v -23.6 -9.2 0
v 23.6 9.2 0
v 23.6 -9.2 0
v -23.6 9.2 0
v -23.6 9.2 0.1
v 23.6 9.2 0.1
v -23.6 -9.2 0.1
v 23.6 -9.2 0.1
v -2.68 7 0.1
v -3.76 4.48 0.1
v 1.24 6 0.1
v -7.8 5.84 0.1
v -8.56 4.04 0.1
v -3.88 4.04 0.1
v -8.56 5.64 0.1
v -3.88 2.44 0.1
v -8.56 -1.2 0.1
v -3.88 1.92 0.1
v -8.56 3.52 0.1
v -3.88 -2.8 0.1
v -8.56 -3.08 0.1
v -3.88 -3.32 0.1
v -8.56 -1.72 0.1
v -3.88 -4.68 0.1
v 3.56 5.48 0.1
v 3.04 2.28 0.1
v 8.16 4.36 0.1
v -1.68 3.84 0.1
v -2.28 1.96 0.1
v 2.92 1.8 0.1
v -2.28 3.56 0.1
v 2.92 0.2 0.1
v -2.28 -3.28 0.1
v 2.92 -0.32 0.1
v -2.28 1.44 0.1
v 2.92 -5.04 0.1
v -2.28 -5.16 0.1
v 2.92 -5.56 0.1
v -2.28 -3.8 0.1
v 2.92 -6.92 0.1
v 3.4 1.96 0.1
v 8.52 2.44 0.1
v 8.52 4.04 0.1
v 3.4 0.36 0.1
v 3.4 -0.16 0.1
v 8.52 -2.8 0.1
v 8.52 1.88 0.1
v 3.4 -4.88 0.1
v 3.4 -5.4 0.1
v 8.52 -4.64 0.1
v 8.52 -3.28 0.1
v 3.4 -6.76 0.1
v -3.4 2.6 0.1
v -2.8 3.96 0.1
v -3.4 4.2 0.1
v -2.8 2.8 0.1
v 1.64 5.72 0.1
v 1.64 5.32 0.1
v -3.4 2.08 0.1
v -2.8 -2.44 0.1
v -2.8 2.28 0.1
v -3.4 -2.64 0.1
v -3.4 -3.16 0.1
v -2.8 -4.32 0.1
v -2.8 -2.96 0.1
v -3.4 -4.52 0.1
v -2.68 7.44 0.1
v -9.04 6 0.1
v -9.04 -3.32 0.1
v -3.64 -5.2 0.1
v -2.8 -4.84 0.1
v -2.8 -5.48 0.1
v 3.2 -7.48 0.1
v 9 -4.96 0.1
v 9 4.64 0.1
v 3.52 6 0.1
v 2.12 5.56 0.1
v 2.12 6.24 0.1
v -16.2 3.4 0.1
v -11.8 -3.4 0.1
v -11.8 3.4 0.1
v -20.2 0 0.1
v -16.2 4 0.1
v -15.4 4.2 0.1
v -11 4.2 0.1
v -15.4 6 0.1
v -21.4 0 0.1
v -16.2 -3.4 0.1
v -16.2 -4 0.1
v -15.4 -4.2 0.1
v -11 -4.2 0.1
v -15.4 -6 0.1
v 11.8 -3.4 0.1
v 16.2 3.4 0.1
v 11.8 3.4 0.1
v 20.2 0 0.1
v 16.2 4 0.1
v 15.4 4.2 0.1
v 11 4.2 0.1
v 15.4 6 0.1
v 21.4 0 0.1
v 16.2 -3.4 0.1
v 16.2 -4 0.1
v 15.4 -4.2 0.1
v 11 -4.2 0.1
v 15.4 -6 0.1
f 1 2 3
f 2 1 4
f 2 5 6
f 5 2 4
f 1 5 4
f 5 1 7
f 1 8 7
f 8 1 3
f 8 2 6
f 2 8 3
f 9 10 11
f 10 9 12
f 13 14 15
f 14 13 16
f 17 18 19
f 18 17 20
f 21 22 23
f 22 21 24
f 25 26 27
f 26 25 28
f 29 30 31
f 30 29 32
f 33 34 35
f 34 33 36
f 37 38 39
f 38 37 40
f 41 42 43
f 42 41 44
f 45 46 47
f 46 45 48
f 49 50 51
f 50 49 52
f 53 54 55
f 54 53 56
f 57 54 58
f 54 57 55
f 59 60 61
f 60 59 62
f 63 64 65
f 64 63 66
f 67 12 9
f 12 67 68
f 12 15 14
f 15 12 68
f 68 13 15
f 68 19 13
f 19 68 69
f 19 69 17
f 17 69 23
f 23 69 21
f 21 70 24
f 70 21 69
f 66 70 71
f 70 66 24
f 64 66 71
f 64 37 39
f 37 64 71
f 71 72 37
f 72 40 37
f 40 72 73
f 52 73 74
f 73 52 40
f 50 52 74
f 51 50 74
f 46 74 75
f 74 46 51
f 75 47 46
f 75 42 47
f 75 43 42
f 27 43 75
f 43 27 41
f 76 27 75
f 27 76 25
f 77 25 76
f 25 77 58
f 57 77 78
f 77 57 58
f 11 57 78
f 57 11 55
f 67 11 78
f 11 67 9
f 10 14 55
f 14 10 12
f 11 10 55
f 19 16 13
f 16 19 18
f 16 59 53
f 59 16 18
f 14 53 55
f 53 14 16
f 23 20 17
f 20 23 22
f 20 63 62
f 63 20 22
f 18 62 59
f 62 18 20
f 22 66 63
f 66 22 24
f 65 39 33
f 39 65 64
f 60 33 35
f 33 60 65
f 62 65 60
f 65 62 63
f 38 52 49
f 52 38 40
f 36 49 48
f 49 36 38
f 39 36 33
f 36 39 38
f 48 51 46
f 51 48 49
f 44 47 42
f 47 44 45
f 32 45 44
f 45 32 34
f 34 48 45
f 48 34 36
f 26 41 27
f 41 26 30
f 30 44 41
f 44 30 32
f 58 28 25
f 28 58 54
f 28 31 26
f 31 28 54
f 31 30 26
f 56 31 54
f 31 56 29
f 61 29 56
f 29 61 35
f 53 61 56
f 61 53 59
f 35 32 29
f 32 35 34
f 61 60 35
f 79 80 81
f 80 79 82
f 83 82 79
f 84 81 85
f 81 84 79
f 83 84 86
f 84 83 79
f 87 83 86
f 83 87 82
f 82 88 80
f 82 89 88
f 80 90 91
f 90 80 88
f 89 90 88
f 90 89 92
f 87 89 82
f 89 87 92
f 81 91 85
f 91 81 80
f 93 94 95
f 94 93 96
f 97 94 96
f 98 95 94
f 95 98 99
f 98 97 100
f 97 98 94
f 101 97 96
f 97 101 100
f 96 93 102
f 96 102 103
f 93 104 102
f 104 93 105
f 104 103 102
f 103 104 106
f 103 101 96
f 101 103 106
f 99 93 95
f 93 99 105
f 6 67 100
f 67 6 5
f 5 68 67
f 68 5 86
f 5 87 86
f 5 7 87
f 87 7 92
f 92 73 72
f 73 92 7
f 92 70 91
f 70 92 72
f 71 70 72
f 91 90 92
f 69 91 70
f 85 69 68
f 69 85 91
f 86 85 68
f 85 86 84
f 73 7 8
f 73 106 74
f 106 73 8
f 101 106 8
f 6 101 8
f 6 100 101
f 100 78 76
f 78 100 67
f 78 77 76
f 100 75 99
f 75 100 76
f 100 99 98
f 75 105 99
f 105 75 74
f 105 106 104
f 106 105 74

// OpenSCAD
// file: ../p/box5-12.scad
use <../lib.scad>
function ldraw_lib__box5_12() = [
// 0 Box with 5 Faces without Any Edges
// 0 Name: box5-12.dat
// 0 Author: Chris Dee [cwdee]
// 0 !LDRAW_ORG Primitive UPDATE 2009-02
// 0 !LICENSE Licensed under CC BY 4.0 : see CAreadme.txt
// 
// 0 BFC CERTIFY CCW
  [0,"BFC","CERTIFY"],
  [0,"BFC","CCW"],
// 
// 0 !HISTORY 2009-09-03 [PTadmin] Official Update 2009-02
// 
// 
// 4 16 1 1 1 1 1 -1 -1 1 -1 -1 1 1
  [4,16,1,1,1,1,1,-1,-1,1,-1,-1,1,1],
// 4 16 -1 0 1 1 0 1 1 1 1 -1 1 1
  [4,16,-1,0,1,1,0,1,1,1,1,-1,1,1],
// 4 16 -1 0 -1 -1 0 1 -1 1 1 -1 1 -1
  [4,16,-1,0,-1,-1,0,1,-1,1,1,-1,1,-1],
// 4 16 1 0 -1 -1 0 -1 -1 1 -1 1 1 -1
  [4,16,1,0,-1,-1,0,-1,-1,1,-1,1,1,-1],
// 4 16 1 0 1 1 0 -1 1 1 -1 1 1 1
  [4,16,1,0,1,1,0,-1,1,1,-1,1,1,1],
// 0
];
module ldraw_lib__box5_12(step=0, col=false, unit=2/5, alt=false, line=0.2, solid=!$preview)
    makepoly(ldraw_lib__box5_12(), step=step, col=col, unit=unit, alt=alt, line=line, solid=solid);
ldraw_lib__box5_12(line=0.2);
// main file
use <../lib.scad>
use <../p/box5-12.scad>
function ldraw_lib__195645a() = [
// 0 Sticker  2.3 x  5.9 with Boxes and Arrows
// 0 Name: 195645a.dat
// 0 Author: Takeshi Takahashi [RainbowDolphin]
// 0 !LDRAW_ORG Part UPDATE 2025-03
// 0 !LICENSE Licensed under CC BY 4.0 : see CAreadme.txt
// 
// 0 BFC CERTIFY CCW
  [0,"BFC","CERTIFY"],
  [0,"BFC","CCW"],
// 
// 0 !KEYWORDS Bricklink 6391stk01, Brickowl 195645, Cargo, Parcel
// 0 !KEYWORDS Rebrickable 195645, Set 6391, Signboard
// 
// 0 !HISTORY 2025-03-30 [OrionP] Official Update 2025-03
// 
// 1 16 0 -0.25 0 59 0 0 0 0.25 0 0 0 23 box5-12.dat
  [1,16,0,-0.25,0,59,0,0,0,0.25,0,0,0,23, ldraw_lib__box5_12()],
// 4 14 -6.7 -0.25 17.5 -19.5 -0.25 14.6 -9.4 -0.25 11.2 3.1 -0.25 15
  [4,14,-6.7,-0.25,17.5,-19.5,-0.25,14.6,-9.4,-0.25,11.2,3.1,-0.25,15],
// 4 14 -9.7 -0.25 6.1 -9.7 -0.25 10.1 -21.4 -0.25 14.1 -21.4 -0.25 10.1
  [4,14,-9.7,-0.25,6.1,-9.7,-0.25,10.1,-21.4,-0.25,14.1,-21.4,-0.25,10.1],
// 4 14 -9.7 -0.25 4.8 -21.4 -0.25 8.8 -21.4 -0.25 -3 -9.7 -0.25 -7
  [4,14,-9.7,-0.25,4.8,-21.4,-0.25,8.8,-21.4,-0.25,-3,-9.7,-0.25,-7],
// 4 14 -9.7 -0.25 -8.3 -21.4 -0.25 -4.3 -21.4 -0.25 -7.7 -9.7 -0.25 -11.7
  [4,14,-9.7,-0.25,-8.3,-21.4,-0.25,-4.3,-21.4,-0.25,-7.7,-9.7,-0.25,-11.7],
// 4 14 8.9 -0.25 13.7 -4.2 -0.25 9.6 7.6 -0.25 5.7 20.4 -0.25 10.9
  [4,14,8.9,-0.25,13.7,-4.2,-0.25,9.6,7.6,-0.25,5.7,20.4,-0.25,10.9],
// 4 14 7.3 -0.25 0.5 7.3 -0.25 4.5 -5.7 -0.25 8.9 -5.7 -0.25 4.9
  [4,14,7.3,-0.25,0.5,7.3,-0.25,4.5,-5.7,-0.25,8.9,-5.7,-0.25,4.9],
// 4 14 7.3 -0.25 -0.8 -5.7 -0.25 3.6 -5.7 -0.25 -8.2 7.3 -0.25 -12.6
  [4,14,7.3,-0.25,-0.8,-5.7,-0.25,3.6,-5.7,-0.25,-8.2,7.3,-0.25,-12.6],
// 4 14 7.3 -0.25 -13.9 -5.7 -0.25 -9.5 -5.7 -0.25 -12.9 7.3 -0.25 -17.3
  [4,14,7.3,-0.25,-13.9,-5.7,-0.25,-9.5,-5.7,-0.25,-12.9,7.3,-0.25,-17.3],
// 4 14 21.3 -0.25 10.1 8.5 -0.25 4.9 8.5 -0.25 0.9 21.3 -0.25 6.1
  [4,14,21.3,-0.25,10.1,8.5,-0.25,4.9,8.5,-0.25,0.9,21.3,-0.25,6.1],
// 4 14 21.3 -0.25 -7 21.3 -0.25 4.7 8.5 -0.25 -0.4 8.5 -0.25 -12.2
  [4,14,21.3,-0.25,-7,21.3,-0.25,4.7,8.5,-0.25,-0.4,8.5,-0.25,-12.2],
// 4 14 21.3 -0.25 -8.2 8.5 -0.25 -13.5 8.5 -0.25 -16.9 21.3 -0.25 -11.6
  [4,14,21.3,-0.25,-8.2,8.5,-0.25,-13.5,8.5,-0.25,-16.9,21.3,-0.25,-11.6],
// 4 14 -8.5 -0.25 10.5 -8.5 -0.25 6.5 -7 -0.25 7 -7 -0.25 9.9
  [4,14,-8.5,-0.25,10.5,-8.5,-0.25,6.5,-7,-0.25,7,-7,-0.25,9.9],
// 4 14 4.1 -0.25 14.3 -8.5 -0.25 10.5 -7 -0.25 9.9 4.1 -0.25 13.3
  [4,14,4.1,-0.25,14.3,-8.5,-0.25,10.5,-7,-0.25,9.9,4.1,-0.25,13.3],
// 4 14 -7 -0.25 5.7 -8.5 -0.25 5.2 -8.5 -0.25 -6.6 -7 -0.25 -6.1
  [4,14,-7,-0.25,5.7,-8.5,-0.25,5.2,-8.5,-0.25,-6.6,-7,-0.25,-6.1],
// 4 14 -7 -0.25 -7.4 -8.5 -0.25 -7.9 -8.5 -0.25 -11.3 -7 -0.25 -10.8
  [4,14,-7,-0.25,-7.4,-8.5,-0.25,-7.9,-8.5,-0.25,-11.3,-7,-0.25,-10.8],
// 4 0 -6.7 -0.25 17.5 -6.7 -0.25 18.6 -22.6 -0.25 15 -19.5 -0.25 14.6
  [4,0,-6.7,-0.25,17.5,-6.7,-0.25,18.6,-22.6,-0.25,15,-19.5,-0.25,14.6],
// 4 0 -19.5 -0.25 14.6 -22.6 -0.25 15 -21.4 -0.25 14.1 -9.7 -0.25 10.1
  [4,0,-19.5,-0.25,14.6,-22.6,-0.25,15,-21.4,-0.25,14.1,-9.7,-0.25,10.1],
// 3 0 -22.6 -0.25 15 -21.4 -0.25 10.1 -21.4 -0.25 14.1
  [3,0,-22.6,-0.25,15,-21.4,-0.25,10.1,-21.4,-0.25,14.1],
// 4 0 -21.4 -0.25 8.8 -21.4 -0.25 10.1 -22.6 -0.25 15 -22.6 -0.25 -8.3
  [4,0,-21.4,-0.25,8.8,-21.4,-0.25,10.1,-22.6,-0.25,15,-22.6,-0.25,-8.3],
// 3 0 -21.4 -0.25 8.8 -22.6 -0.25 -8.3 -21.4 -0.25 -3
  [3,0,-21.4,-0.25,8.8,-22.6,-0.25,-8.3,-21.4,-0.25,-3],
// 3 0 -21.4 -0.25 -3 -22.6 -0.25 -8.3 -21.4 -0.25 -4.3
  [3,0,-21.4,-0.25,-3,-22.6,-0.25,-8.3,-21.4,-0.25,-4.3],
// 3 0 -21.4 -0.25 -4.3 -22.6 -0.25 -8.3 -21.4 -0.25 -7.7
  [3,0,-21.4,-0.25,-4.3,-22.6,-0.25,-8.3,-21.4,-0.25,-7.7],
// 4 0 -21.4 -0.25 -7.7 -22.6 -0.25 -8.3 -9.1 -0.25 -13 -9.7 -0.25 -11.7
  [4,0,-21.4,-0.25,-7.7,-22.6,-0.25,-8.3,-9.1,-0.25,-13,-9.7,-0.25,-11.7],
// 4 0 -8.5 -0.25 -11.3 -9.7 -0.25 -11.7 -9.1 -0.25 -13 -7 -0.25 -12.1
  [4,0,-8.5,-0.25,-11.3,-9.7,-0.25,-11.7,-9.1,-0.25,-13,-7,-0.25,-12.1],
// 3 0 -7 -0.25 -10.8 -8.5 -0.25 -11.3 -7 -0.25 -12.1
  [3,0,-7,-0.25,-10.8,-8.5,-0.25,-11.3,-7,-0.25,-12.1],
// 4 0 -5.7 -0.25 -9.5 -7 -0.25 -10.8 -7 -0.25 -12.1 -5.7 -0.25 -12.9
  [4,0,-5.7,-0.25,-9.5,-7,-0.25,-10.8,-7,-0.25,-12.1,-5.7,-0.25,-12.9],
// 3 0 -7 -0.25 -12.1 -7 -0.25 -13.7 -5.7 -0.25 -12.9
  [3,0,-7,-0.25,-12.1,-7,-0.25,-13.7,-5.7,-0.25,-12.9],
// 4 0 7.3 -0.25 -17.3 -5.7 -0.25 -12.9 -7 -0.25 -13.7 8 -0.25 -18.7
  [4,0,7.3,-0.25,-17.3,-5.7,-0.25,-12.9,-7,-0.25,-13.7,8,-0.25,-18.7],
// 4 0 8.5 -0.25 -16.9 7.3 -0.25 -17.3 8 -0.25 -18.7 22.5 -0.25 -12.4
  [4,0,8.5,-0.25,-16.9,7.3,-0.25,-17.3,8,-0.25,-18.7,22.5,-0.25,-12.4],
// 3 0 21.3 -0.25 -11.6 8.5 -0.25 -16.9 22.5 -0.25 -12.4
  [3,0,21.3,-0.25,-11.6,8.5,-0.25,-16.9,22.5,-0.25,-12.4],
// 3 0 21.3 -0.25 -8.2 21.3 -0.25 -11.6 22.5 -0.25 -12.4
  [3,0,21.3,-0.25,-8.2,21.3,-0.25,-11.6,22.5,-0.25,-12.4],
// 4 0 21.3 -0.25 -7 21.3 -0.25 -8.2 22.5 -0.25 -12.4 22.5 -0.25 11.6
  [4,0,21.3,-0.25,-7,21.3,-0.25,-8.2,22.5,-0.25,-12.4,22.5,-0.25,11.6],
// 3 0 22.5 -0.25 11.6 21.3 -0.25 4.7 21.3 -0.25 -7
  [3,0,22.5,-0.25,11.6,21.3,-0.25,4.7,21.3,-0.25,-7],
// 3 0 22.5 -0.25 11.6 21.3 -0.25 6.1 21.3 -0.25 4.7
  [3,0,22.5,-0.25,11.6,21.3,-0.25,6.1,21.3,-0.25,4.7],
// 3 0 22.5 -0.25 11.6 21.3 -0.25 10.1 21.3 -0.25 6.1
  [3,0,22.5,-0.25,11.6,21.3,-0.25,10.1,21.3,-0.25,6.1],
// 4 0 21.3 -0.25 10.1 22.5 -0.25 11.6 20.4 -0.25 10.9 8.5 -0.25 4.9
  [4,0,21.3,-0.25,10.1,22.5,-0.25,11.6,20.4,-0.25,10.9,8.5,-0.25,4.9],
// 4 0 20.4 -0.25 10.9 22.5 -0.25 11.6 8.8 -0.25 15 8.9 -0.25 13.7
  [4,0,20.4,-0.25,10.9,22.5,-0.25,11.6,8.8,-0.25,15,8.9,-0.25,13.7],
// 4 0 8.9 -0.25 13.7 8.8 -0.25 15 5.3 -0.25 13.9 4.1 -0.25 13.3
  [4,0,8.9,-0.25,13.7,8.8,-0.25,15,5.3,-0.25,13.9,4.1,-0.25,13.3],
// 4 0 4.1 -0.25 14.3 4.1 -0.25 13.3 5.3 -0.25 13.9 5.3 -0.25 15.6
  [4,0,4.1,-0.25,14.3,4.1,-0.25,13.3,5.3,-0.25,13.9,5.3,-0.25,15.6],
// 4 0 4.1 -0.25 14.3 5.3 -0.25 15.6 3.1 -0.25 15 -8.5 -0.25 10.5
  [4,0,4.1,-0.25,14.3,5.3,-0.25,15.6,3.1,-0.25,15,-8.5,-0.25,10.5],
// 4 0 3.1 -0.25 15 5.3 -0.25 15.6 -6.7 -0.25 18.6 -6.7 -0.25 17.5
  [4,0,3.1,-0.25,15,5.3,-0.25,15.6,-6.7,-0.25,18.6,-6.7,-0.25,17.5],
// 4 0 -9.4 -0.25 11.2 -19.5 -0.25 14.6 -9.7 -0.25 10.1 -8.5 -0.25 10.5
  [4,0,-9.4,-0.25,11.2,-19.5,-0.25,14.6,-9.7,-0.25,10.1,-8.5,-0.25,10.5],
// 3 0 3.1 -0.25 15 -9.4 -0.25 11.2 -8.5 -0.25 10.5
  [3,0,3.1,-0.25,15,-9.4,-0.25,11.2,-8.5,-0.25,10.5],
// 4 0 -9.7 -0.25 6.1 -21.4 -0.25 10.1 -21.4 -0.25 8.8 -9.7 -0.25 4.8
  [4,0,-9.7,-0.25,6.1,-21.4,-0.25,10.1,-21.4,-0.25,8.8,-9.7,-0.25,4.8],
// 4 0 -8.5 -0.25 6.5 -9.7 -0.25 6.1 -9.7 -0.25 4.8 -8.5 -0.25 5.2
  [4,0,-8.5,-0.25,6.5,-9.7,-0.25,6.1,-9.7,-0.25,4.8,-8.5,-0.25,5.2],
// 4 0 -9.7 -0.25 6.1 -8.5 -0.25 6.5 -8.5 -0.25 10.5 -9.7 -0.25 10.1
  [4,0,-9.7,-0.25,6.1,-8.5,-0.25,6.5,-8.5,-0.25,10.5,-9.7,-0.25,10.1],
// 4 0 -9.7 -0.25 -7 -21.4 -0.25 -3 -21.4 -0.25 -4.3 -9.7 -0.25 -8.3
  [4,0,-9.7,-0.25,-7,-21.4,-0.25,-3,-21.4,-0.25,-4.3,-9.7,-0.25,-8.3],
// 4 0 -9.7 -0.25 -7 -9.7 -0.25 -8.3 -8.5 -0.25 -7.9 -8.5 -0.25 -6.6
  [4,0,-9.7,-0.25,-7,-9.7,-0.25,-8.3,-8.5,-0.25,-7.9,-8.5,-0.25,-6.6],
// 4 0 -9.7 -0.25 4.8 -9.7 -0.25 -7 -8.5 -0.25 -6.6 -8.5 -0.25 5.2
  [4,0,-9.7,-0.25,4.8,-9.7,-0.25,-7,-8.5,-0.25,-6.6,-8.5,-0.25,5.2],
// 4 0 -9.7 -0.25 -8.3 -9.7 -0.25 -11.7 -8.5 -0.25 -11.3 -8.5 -0.25 -7.9
  [4,0,-9.7,-0.25,-8.3,-9.7,-0.25,-11.7,-8.5,-0.25,-11.3,-8.5,-0.25,-7.9],
// 4 0 -7 -0.25 -7.4 -7 -0.25 -10.8 -5.7 -0.25 -9.5 -5.7 -0.25 -8.2
  [4,0,-7,-0.25,-7.4,-7,-0.25,-10.8,-5.7,-0.25,-9.5,-5.7,-0.25,-8.2],
// 4 0 -7 -0.25 -6.1 -7 -0.25 -7.4 -5.7 -0.25 -8.2 -5.7 -0.25 3.6
  [4,0,-7,-0.25,-6.1,-7,-0.25,-7.4,-5.7,-0.25,-8.2,-5.7,-0.25,3.6],
// 4 0 -8.5 -0.25 -7.9 -7 -0.25 -7.4 -7 -0.25 -6.1 -8.5 -0.25 -6.6
  [4,0,-8.5,-0.25,-7.9,-7,-0.25,-7.4,-7,-0.25,-6.1,-8.5,-0.25,-6.6],
// 4 0 7.3 -0.25 -13.9 7.3 -0.25 -17.3 8.5 -0.25 -16.9 8.5 -0.25 -13.5
  [4,0,7.3,-0.25,-13.9,7.3,-0.25,-17.3,8.5,-0.25,-16.9,8.5,-0.25,-13.5],
// 4 0 7.3 -0.25 -13.9 8.5 -0.25 -13.5 8.5 -0.25 -12.2 7.3 -0.25 -12.6
  [4,0,7.3,-0.25,-13.9,8.5,-0.25,-13.5,8.5,-0.25,-12.2,7.3,-0.25,-12.6],
// 4 0 -5.7 -0.25 -9.5 7.3 -0.25 -13.9 7.3 -0.25 -12.6 -5.7 -0.25 -8.2
  [4,0,-5.7,-0.25,-9.5,7.3,-0.25,-13.9,7.3,-0.25,-12.6,-5.7,-0.25,-8.2],
// 4 0 8.5 -0.25 -13.5 21.3 -0.25 -8.2 21.3 -0.25 -7 8.5 -0.25 -12.2
  [4,0,8.5,-0.25,-13.5,21.3,-0.25,-8.2,21.3,-0.25,-7,8.5,-0.25,-12.2],
// 4 0 21.3 -0.25 4.7 21.3 -0.25 6.1 8.5 -0.25 0.9 8.5 -0.25 -0.4
  [4,0,21.3,-0.25,4.7,21.3,-0.25,6.1,8.5,-0.25,0.9,8.5,-0.25,-0.4],
// 4 0 8.5 -0.25 -0.4 8.5 -0.25 0.9 7.3 -0.25 0.5 7.3 -0.25 -0.8
  [4,0,8.5,-0.25,-0.4,8.5,-0.25,0.9,7.3,-0.25,0.5,7.3,-0.25,-0.8],
// 4 0 8.5 -0.25 -12.2 8.5 -0.25 -0.4 7.3 -0.25 -0.8 7.3 -0.25 -12.6
  [4,0,8.5,-0.25,-12.2,8.5,-0.25,-0.4,7.3,-0.25,-0.8,7.3,-0.25,-12.6],
// 4 0 8.5 -0.25 4.9 20.4 -0.25 10.9 7.6 -0.25 5.7 7.3 -0.25 4.5
  [4,0,8.5,-0.25,4.9,20.4,-0.25,10.9,7.6,-0.25,5.7,7.3,-0.25,4.5],
// 4 0 8.5 -0.25 0.9 8.5 -0.25 4.9 7.3 -0.25 4.5 7.3 -0.25 0.5
  [4,0,8.5,-0.25,0.9,8.5,-0.25,4.9,7.3,-0.25,4.5,7.3,-0.25,0.5],
// 4 0 -4.2 -0.25 9.6 8.9 -0.25 13.7 4.1 -0.25 13.3 -7 -0.25 9.9
  [4,0,-4.2,-0.25,9.6,8.9,-0.25,13.7,4.1,-0.25,13.3,-7,-0.25,9.9],
// 4 0 -4.2 -0.25 9.6 -7 -0.25 9.9 -5.7 -0.25 8.9 7.6 -0.25 5.7
  [4,0,-4.2,-0.25,9.6,-7,-0.25,9.9,-5.7,-0.25,8.9,7.6,-0.25,5.7],
// 3 0 -5.7 -0.25 8.9 7.3 -0.25 4.5 7.6 -0.25 5.7
  [3,0,-5.7,-0.25,8.9,7.3,-0.25,4.5,7.6,-0.25,5.7],
// 4 0 -5.7 -0.25 8.9 -7 -0.25 9.9 -7 -0.25 7 -5.7 -0.25 4.9
  [4,0,-5.7,-0.25,8.9,-7,-0.25,9.9,-7,-0.25,7,-5.7,-0.25,4.9],
// 4 0 -5.7 -0.25 4.9 -7 -0.25 7 -7 -0.25 5.7 -5.7 -0.25 3.6
  [4,0,-5.7,-0.25,4.9,-7,-0.25,7,-7,-0.25,5.7,-5.7,-0.25,3.6],
// 4 0 -7 -0.25 5.7 -7 -0.25 7 -8.5 -0.25 6.5 -8.5 -0.25 5.2
  [4,0,-7,-0.25,5.7,-7,-0.25,7,-8.5,-0.25,6.5,-8.5,-0.25,5.2],
// 4 0 7.3 -0.25 0.5 -5.7 -0.25 4.9 -5.7 -0.25 3.6 7.3 -0.25 -0.8
  [4,0,7.3,-0.25,0.5,-5.7,-0.25,4.9,-5.7,-0.25,3.6,7.3,-0.25,-0.8],
// 3 0 -7 -0.25 5.7 -7 -0.25 -6.1 -5.7 -0.25 3.6
  [3,0,-7,-0.25,5.7,-7,-0.25,-6.1,-5.7,-0.25,3.6],
// 4 14 -29.5 -.25 8.5 -40.5 -.25 8.5 -50.5 -.25 0 -29.5 -.25 -8.5
  [4,14,-29.5,-.25,8.5,-40.5,-.25,8.5,-50.5,-.25,0,-29.5,-.25,-8.5],
// 3 14 -40.5 -.25 10 -50.5 -.25 0 -40.5 -.25 8.5
  [3,14,-40.5,-.25,10,-50.5,-.25,0,-40.5,-.25,8.5],
// 4 0 -40.5 -.25 8.5 -29.5 -.25 8.5 -27.5 -.25 10.5 -38.5 -.25 10.5
  [4,0,-40.5,-.25,8.5,-29.5,-.25,8.5,-27.5,-.25,10.5,-38.5,-.25,10.5],
// 4 0 -40.5 -.25 10 -40.5 -.25 8.5 -38.5 -.25 10.5 -38.5 -.25 15
  [4,0,-40.5,-.25,10,-40.5,-.25,8.5,-38.5,-.25,10.5,-38.5,-.25,15],
// 4 0 -50.5 -.25 0 -40.5 -.25 10 -38.5 -.25 15 -53.5 -.25 0
  [4,0,-50.5,-.25,0,-40.5,-.25,10,-38.5,-.25,15,-53.5,-.25,0],
// 3 14 -50.5 -.25 0 -40.5 -.25 -8.5 -29.5 -.25 -8.5
  [3,14,-50.5,-.25,0,-40.5,-.25,-8.5,-29.5,-.25,-8.5],
// 3 14 -50.5 -.25 0 -40.5 -.25 -10 -40.5 -.25 -8.5
  [3,14,-50.5,-.25,0,-40.5,-.25,-10,-40.5,-.25,-8.5],
// 4 0 -27.5 -.25 -10.5 -29.5 -.25 -8.5 -40.5 -.25 -8.5 -38.5 -.25 -10.5
  [4,0,-27.5,-.25,-10.5,-29.5,-.25,-8.5,-40.5,-.25,-8.5,-38.5,-.25,-10.5],
// 4 0 -38.5 -.25 -10.5 -40.5 -.25 -8.5 -40.5 -.25 -10 -38.5 -.25 -15
  [4,0,-38.5,-.25,-10.5,-40.5,-.25,-8.5,-40.5,-.25,-10,-38.5,-.25,-15],
// 4 0 -38.5 -.25 -15 -40.5 -.25 -10 -50.5 -.25 0 -53.5 -.25 0
  [4,0,-38.5,-.25,-15,-40.5,-.25,-10,-50.5,-.25,0,-53.5,-.25,0],
// 4 0 -27.5 -.25 10.5 -29.5 -.25 8.5 -29.5 -.25 -8.5 -27.5 -.25 -10.5
  [4,0,-27.5,-.25,10.5,-29.5,-.25,8.5,-29.5,-.25,-8.5,-27.5,-.25,-10.5],
// 4 14 50.5 -.25 0 40.5 -.25 8.5 29.5 -.25 8.5 29.5 -.25 -8.5
  [4,14,50.5,-.25,0,40.5,-.25,8.5,29.5,-.25,8.5,29.5,-.25,-8.5],
// 3 14 40.5 -.25 10 40.5 -.25 8.5 50.5 -.25 0
  [3,14,40.5,-.25,10,40.5,-.25,8.5,50.5,-.25,0],
// 4 0 27.5 -.25 10.5 29.5 -.25 8.5 40.5 -.25 8.5 38.5 -.25 10.5
  [4,0,27.5,-.25,10.5,29.5,-.25,8.5,40.5,-.25,8.5,38.5,-.25,10.5],
// 4 0 38.5 -.25 10.5 40.5 -.25 8.5 40.5 -.25 10 38.5 -.25 15
  [4,0,38.5,-.25,10.5,40.5,-.25,8.5,40.5,-.25,10,38.5,-.25,15],
// 4 0 38.5 -.25 15 40.5 -.25 10 50.5 -.25 0 53.5 -.25 0
  [4,0,38.5,-.25,15,40.5,-.25,10,50.5,-.25,0,53.5,-.25,0],
// 3 14 50.5 -.25 0 29.5 -.25 -8.5 40.5 -.25 -8.5
  [3,14,50.5,-.25,0,29.5,-.25,-8.5,40.5,-.25,-8.5],
// 3 14 50.5 -.25 0 40.5 -.25 -8.5 40.5 -.25 -10
  [3,14,50.5,-.25,0,40.5,-.25,-8.5,40.5,-.25,-10],
// 4 0 40.5 -.25 -8.5 29.5 -.25 -8.5 27.5 -.25 -10.5 38.5 -.25 -10.5
  [4,0,40.5,-.25,-8.5,29.5,-.25,-8.5,27.5,-.25,-10.5,38.5,-.25,-10.5],
// 4 0 40.5 -.25 -10 40.5 -.25 -8.5 38.5 -.25 -10.5 38.5 -.25 -15
  [4,0,40.5,-.25,-10,40.5,-.25,-8.5,38.5,-.25,-10.5,38.5,-.25,-15],
// 4 0 50.5 -.25 0 40.5 -.25 -10 38.5 -.25 -15 53.5 -.25 0
  [4,0,50.5,-.25,0,40.5,-.25,-10,38.5,-.25,-15,53.5,-.25,0],
// 4 0 29.5 -.25 -8.5 29.5 -.25 8.5 27.5 -.25 10.5 27.5 -.25 -10.5
  [4,0,29.5,-.25,-8.5,29.5,-.25,8.5,27.5,-.25,10.5,27.5,-.25,-10.5],
// 4 15 59 -0.25 23 -59 -0.25 23 -6.7 -0.25 18.6 38.5 -0.25 15
  [4,15,59,-0.25,23,-59,-0.25,23,-6.7,-0.25,18.6,38.5,-0.25,15],
// 4 15 -22.6 -0.25 15 -6.7 -0.25 18.6 -59 -0.25 23 -38.5 -0.25 15
  [4,15,-22.6,-0.25,15,-6.7,-0.25,18.6,-59,-0.25,23,-38.5,-0.25,15],
// 3 15 -59 -0.25 23 -53.5 -0.25 0 -38.5 -0.25 15
  [3,15,-59,-0.25,23,-53.5,-0.25,0,-38.5,-0.25,15],
// 3 15 -59 -0.25 23 -59 -0.25 -23 -53.5 -0.25 0
  [3,15,-59,-0.25,23,-59,-0.25,-23,-53.5,-0.25,0],
// 3 15 -53.5 -0.25 0 -59 -0.25 -23 -38.5 -0.25 -15
  [3,15,-53.5,-0.25,0,-59,-0.25,-23,-38.5,-0.25,-15],
// 4 15 -38.5 -0.25 -15 -59 -0.25 -23 8 -0.25 -18.7 -7 -0.25 -13.7
  [4,15,-38.5,-0.25,-15,-59,-0.25,-23,8,-0.25,-18.7,-7,-0.25,-13.7],
// 4 15 -38.5 -0.25 -15 -7 -0.25 -13.7 -9.1 -0.25 -13 -27.5 -0.25 -10.5
  [4,15,-38.5,-0.25,-15,-7,-0.25,-13.7,-9.1,-0.25,-13,-27.5,-0.25,-10.5],
// 3 15 -7 -0.25 -12.1 -9.1 -0.25 -13 -7 -0.25 -13.7
  [3,15,-7,-0.25,-12.1,-9.1,-0.25,-13,-7,-0.25,-13.7],
// 3 15 -27.5 -0.25 -10.5 -38.5 -0.25 -10.5 -38.5 -0.25 -15
  [3,15,-27.5,-0.25,-10.5,-38.5,-0.25,-10.5,-38.5,-0.25,-15],
// 3 15 -22.6 -0.25 -8.3 -27.5 -0.25 -10.5 -9.1 -0.25 -13
  [3,15,-22.6,-0.25,-8.3,-27.5,-0.25,-10.5,-9.1,-0.25,-13],
// 4 15 -27.5 -0.25 10.5 -27.5 -0.25 -10.5 -22.6 -0.25 -8.3 -22.6 -0.25 15
  [4,15,-27.5,-0.25,10.5,-27.5,-0.25,-10.5,-22.6,-0.25,-8.3,-22.6,-0.25,15],
// 4 15 -27.5 -0.25 10.5 -22.6 -0.25 15 -38.5 -0.25 15 -38.5 -0.25 10.5
  [4,15,-27.5,-0.25,10.5,-22.6,-0.25,15,-38.5,-0.25,15,-38.5,-0.25,10.5],
// 3 15 8 -0.25 -18.7 -59 -0.25 -23 59 -0.25 -23
  [3,15,8,-0.25,-18.7,-59,-0.25,-23,59,-0.25,-23],
// 4 15 8 -0.25 -18.7 59 -0.25 -23 38.5 -0.25 -15 22.5 -0.25 -12.4
  [4,15,8,-0.25,-18.7,59,-0.25,-23,38.5,-0.25,-15,22.5,-0.25,-12.4],
// 3 15 53.5 -0.25 0 38.5 -0.25 -15 59 -0.25 -23
  [3,15,53.5,-0.25,0,38.5,-0.25,-15,59,-0.25,-23],
// 3 15 59 -0.25 23 53.5 -0.25 0 59 -0.25 -23
  [3,15,59,-0.25,23,53.5,-0.25,0,59,-0.25,-23],
// 3 15 59 -0.25 23 38.5 -0.25 15 53.5 -0.25 0
  [3,15,59,-0.25,23,38.5,-0.25,15,53.5,-0.25,0],
// 4 15 38.5 -0.25 15 -6.7 -0.25 18.6 5.3 -0.25 15.6 8.8 -0.25 15
  [4,15,38.5,-0.25,15,-6.7,-0.25,18.6,5.3,-0.25,15.6,8.8,-0.25,15],
// 3 15 5.3 -0.25 15.6 5.3 -0.25 13.9 8.8 -0.25 15
  [3,15,5.3,-0.25,15.6,5.3,-0.25,13.9,8.8,-0.25,15],
// 4 15 38.5 -0.25 15 8.8 -0.25 15 22.5 -0.25 11.6 27.5 -0.25 10.5
  [4,15,38.5,-0.25,15,8.8,-0.25,15,22.5,-0.25,11.6,27.5,-0.25,10.5],
// 3 15 38.5 -0.25 15 27.5 -0.25 10.5 38.5 -0.25 10.5
  [3,15,38.5,-0.25,15,27.5,-0.25,10.5,38.5,-0.25,10.5],
// 4 15 27.5 -0.25 -10.5 27.5 -0.25 10.5 22.5 -0.25 11.6 22.5 -0.25 -12.4
  [4,15,27.5,-0.25,-10.5,27.5,-0.25,10.5,22.5,-0.25,11.6,22.5,-0.25,-12.4],
// 4 15 38.5 -0.25 -10.5 27.5 -0.25 -10.5 22.5 -0.25 -12.4 38.5 -0.25 -15
  [4,15,38.5,-0.25,-10.5,27.5,-0.25,-10.5,22.5,-0.25,-12.4,38.5,-0.25,-15],
];
module ldraw_lib__195645a(step=0, col=false, unit=2/5, alt=false, line=0.2, solid=!$preview)
    makepoly(ldraw_lib__195645a(), step=step, col=col, unit=unit, alt=alt, line=line, solid=solid);
ldraw_lib__195645a(line=0.2);
